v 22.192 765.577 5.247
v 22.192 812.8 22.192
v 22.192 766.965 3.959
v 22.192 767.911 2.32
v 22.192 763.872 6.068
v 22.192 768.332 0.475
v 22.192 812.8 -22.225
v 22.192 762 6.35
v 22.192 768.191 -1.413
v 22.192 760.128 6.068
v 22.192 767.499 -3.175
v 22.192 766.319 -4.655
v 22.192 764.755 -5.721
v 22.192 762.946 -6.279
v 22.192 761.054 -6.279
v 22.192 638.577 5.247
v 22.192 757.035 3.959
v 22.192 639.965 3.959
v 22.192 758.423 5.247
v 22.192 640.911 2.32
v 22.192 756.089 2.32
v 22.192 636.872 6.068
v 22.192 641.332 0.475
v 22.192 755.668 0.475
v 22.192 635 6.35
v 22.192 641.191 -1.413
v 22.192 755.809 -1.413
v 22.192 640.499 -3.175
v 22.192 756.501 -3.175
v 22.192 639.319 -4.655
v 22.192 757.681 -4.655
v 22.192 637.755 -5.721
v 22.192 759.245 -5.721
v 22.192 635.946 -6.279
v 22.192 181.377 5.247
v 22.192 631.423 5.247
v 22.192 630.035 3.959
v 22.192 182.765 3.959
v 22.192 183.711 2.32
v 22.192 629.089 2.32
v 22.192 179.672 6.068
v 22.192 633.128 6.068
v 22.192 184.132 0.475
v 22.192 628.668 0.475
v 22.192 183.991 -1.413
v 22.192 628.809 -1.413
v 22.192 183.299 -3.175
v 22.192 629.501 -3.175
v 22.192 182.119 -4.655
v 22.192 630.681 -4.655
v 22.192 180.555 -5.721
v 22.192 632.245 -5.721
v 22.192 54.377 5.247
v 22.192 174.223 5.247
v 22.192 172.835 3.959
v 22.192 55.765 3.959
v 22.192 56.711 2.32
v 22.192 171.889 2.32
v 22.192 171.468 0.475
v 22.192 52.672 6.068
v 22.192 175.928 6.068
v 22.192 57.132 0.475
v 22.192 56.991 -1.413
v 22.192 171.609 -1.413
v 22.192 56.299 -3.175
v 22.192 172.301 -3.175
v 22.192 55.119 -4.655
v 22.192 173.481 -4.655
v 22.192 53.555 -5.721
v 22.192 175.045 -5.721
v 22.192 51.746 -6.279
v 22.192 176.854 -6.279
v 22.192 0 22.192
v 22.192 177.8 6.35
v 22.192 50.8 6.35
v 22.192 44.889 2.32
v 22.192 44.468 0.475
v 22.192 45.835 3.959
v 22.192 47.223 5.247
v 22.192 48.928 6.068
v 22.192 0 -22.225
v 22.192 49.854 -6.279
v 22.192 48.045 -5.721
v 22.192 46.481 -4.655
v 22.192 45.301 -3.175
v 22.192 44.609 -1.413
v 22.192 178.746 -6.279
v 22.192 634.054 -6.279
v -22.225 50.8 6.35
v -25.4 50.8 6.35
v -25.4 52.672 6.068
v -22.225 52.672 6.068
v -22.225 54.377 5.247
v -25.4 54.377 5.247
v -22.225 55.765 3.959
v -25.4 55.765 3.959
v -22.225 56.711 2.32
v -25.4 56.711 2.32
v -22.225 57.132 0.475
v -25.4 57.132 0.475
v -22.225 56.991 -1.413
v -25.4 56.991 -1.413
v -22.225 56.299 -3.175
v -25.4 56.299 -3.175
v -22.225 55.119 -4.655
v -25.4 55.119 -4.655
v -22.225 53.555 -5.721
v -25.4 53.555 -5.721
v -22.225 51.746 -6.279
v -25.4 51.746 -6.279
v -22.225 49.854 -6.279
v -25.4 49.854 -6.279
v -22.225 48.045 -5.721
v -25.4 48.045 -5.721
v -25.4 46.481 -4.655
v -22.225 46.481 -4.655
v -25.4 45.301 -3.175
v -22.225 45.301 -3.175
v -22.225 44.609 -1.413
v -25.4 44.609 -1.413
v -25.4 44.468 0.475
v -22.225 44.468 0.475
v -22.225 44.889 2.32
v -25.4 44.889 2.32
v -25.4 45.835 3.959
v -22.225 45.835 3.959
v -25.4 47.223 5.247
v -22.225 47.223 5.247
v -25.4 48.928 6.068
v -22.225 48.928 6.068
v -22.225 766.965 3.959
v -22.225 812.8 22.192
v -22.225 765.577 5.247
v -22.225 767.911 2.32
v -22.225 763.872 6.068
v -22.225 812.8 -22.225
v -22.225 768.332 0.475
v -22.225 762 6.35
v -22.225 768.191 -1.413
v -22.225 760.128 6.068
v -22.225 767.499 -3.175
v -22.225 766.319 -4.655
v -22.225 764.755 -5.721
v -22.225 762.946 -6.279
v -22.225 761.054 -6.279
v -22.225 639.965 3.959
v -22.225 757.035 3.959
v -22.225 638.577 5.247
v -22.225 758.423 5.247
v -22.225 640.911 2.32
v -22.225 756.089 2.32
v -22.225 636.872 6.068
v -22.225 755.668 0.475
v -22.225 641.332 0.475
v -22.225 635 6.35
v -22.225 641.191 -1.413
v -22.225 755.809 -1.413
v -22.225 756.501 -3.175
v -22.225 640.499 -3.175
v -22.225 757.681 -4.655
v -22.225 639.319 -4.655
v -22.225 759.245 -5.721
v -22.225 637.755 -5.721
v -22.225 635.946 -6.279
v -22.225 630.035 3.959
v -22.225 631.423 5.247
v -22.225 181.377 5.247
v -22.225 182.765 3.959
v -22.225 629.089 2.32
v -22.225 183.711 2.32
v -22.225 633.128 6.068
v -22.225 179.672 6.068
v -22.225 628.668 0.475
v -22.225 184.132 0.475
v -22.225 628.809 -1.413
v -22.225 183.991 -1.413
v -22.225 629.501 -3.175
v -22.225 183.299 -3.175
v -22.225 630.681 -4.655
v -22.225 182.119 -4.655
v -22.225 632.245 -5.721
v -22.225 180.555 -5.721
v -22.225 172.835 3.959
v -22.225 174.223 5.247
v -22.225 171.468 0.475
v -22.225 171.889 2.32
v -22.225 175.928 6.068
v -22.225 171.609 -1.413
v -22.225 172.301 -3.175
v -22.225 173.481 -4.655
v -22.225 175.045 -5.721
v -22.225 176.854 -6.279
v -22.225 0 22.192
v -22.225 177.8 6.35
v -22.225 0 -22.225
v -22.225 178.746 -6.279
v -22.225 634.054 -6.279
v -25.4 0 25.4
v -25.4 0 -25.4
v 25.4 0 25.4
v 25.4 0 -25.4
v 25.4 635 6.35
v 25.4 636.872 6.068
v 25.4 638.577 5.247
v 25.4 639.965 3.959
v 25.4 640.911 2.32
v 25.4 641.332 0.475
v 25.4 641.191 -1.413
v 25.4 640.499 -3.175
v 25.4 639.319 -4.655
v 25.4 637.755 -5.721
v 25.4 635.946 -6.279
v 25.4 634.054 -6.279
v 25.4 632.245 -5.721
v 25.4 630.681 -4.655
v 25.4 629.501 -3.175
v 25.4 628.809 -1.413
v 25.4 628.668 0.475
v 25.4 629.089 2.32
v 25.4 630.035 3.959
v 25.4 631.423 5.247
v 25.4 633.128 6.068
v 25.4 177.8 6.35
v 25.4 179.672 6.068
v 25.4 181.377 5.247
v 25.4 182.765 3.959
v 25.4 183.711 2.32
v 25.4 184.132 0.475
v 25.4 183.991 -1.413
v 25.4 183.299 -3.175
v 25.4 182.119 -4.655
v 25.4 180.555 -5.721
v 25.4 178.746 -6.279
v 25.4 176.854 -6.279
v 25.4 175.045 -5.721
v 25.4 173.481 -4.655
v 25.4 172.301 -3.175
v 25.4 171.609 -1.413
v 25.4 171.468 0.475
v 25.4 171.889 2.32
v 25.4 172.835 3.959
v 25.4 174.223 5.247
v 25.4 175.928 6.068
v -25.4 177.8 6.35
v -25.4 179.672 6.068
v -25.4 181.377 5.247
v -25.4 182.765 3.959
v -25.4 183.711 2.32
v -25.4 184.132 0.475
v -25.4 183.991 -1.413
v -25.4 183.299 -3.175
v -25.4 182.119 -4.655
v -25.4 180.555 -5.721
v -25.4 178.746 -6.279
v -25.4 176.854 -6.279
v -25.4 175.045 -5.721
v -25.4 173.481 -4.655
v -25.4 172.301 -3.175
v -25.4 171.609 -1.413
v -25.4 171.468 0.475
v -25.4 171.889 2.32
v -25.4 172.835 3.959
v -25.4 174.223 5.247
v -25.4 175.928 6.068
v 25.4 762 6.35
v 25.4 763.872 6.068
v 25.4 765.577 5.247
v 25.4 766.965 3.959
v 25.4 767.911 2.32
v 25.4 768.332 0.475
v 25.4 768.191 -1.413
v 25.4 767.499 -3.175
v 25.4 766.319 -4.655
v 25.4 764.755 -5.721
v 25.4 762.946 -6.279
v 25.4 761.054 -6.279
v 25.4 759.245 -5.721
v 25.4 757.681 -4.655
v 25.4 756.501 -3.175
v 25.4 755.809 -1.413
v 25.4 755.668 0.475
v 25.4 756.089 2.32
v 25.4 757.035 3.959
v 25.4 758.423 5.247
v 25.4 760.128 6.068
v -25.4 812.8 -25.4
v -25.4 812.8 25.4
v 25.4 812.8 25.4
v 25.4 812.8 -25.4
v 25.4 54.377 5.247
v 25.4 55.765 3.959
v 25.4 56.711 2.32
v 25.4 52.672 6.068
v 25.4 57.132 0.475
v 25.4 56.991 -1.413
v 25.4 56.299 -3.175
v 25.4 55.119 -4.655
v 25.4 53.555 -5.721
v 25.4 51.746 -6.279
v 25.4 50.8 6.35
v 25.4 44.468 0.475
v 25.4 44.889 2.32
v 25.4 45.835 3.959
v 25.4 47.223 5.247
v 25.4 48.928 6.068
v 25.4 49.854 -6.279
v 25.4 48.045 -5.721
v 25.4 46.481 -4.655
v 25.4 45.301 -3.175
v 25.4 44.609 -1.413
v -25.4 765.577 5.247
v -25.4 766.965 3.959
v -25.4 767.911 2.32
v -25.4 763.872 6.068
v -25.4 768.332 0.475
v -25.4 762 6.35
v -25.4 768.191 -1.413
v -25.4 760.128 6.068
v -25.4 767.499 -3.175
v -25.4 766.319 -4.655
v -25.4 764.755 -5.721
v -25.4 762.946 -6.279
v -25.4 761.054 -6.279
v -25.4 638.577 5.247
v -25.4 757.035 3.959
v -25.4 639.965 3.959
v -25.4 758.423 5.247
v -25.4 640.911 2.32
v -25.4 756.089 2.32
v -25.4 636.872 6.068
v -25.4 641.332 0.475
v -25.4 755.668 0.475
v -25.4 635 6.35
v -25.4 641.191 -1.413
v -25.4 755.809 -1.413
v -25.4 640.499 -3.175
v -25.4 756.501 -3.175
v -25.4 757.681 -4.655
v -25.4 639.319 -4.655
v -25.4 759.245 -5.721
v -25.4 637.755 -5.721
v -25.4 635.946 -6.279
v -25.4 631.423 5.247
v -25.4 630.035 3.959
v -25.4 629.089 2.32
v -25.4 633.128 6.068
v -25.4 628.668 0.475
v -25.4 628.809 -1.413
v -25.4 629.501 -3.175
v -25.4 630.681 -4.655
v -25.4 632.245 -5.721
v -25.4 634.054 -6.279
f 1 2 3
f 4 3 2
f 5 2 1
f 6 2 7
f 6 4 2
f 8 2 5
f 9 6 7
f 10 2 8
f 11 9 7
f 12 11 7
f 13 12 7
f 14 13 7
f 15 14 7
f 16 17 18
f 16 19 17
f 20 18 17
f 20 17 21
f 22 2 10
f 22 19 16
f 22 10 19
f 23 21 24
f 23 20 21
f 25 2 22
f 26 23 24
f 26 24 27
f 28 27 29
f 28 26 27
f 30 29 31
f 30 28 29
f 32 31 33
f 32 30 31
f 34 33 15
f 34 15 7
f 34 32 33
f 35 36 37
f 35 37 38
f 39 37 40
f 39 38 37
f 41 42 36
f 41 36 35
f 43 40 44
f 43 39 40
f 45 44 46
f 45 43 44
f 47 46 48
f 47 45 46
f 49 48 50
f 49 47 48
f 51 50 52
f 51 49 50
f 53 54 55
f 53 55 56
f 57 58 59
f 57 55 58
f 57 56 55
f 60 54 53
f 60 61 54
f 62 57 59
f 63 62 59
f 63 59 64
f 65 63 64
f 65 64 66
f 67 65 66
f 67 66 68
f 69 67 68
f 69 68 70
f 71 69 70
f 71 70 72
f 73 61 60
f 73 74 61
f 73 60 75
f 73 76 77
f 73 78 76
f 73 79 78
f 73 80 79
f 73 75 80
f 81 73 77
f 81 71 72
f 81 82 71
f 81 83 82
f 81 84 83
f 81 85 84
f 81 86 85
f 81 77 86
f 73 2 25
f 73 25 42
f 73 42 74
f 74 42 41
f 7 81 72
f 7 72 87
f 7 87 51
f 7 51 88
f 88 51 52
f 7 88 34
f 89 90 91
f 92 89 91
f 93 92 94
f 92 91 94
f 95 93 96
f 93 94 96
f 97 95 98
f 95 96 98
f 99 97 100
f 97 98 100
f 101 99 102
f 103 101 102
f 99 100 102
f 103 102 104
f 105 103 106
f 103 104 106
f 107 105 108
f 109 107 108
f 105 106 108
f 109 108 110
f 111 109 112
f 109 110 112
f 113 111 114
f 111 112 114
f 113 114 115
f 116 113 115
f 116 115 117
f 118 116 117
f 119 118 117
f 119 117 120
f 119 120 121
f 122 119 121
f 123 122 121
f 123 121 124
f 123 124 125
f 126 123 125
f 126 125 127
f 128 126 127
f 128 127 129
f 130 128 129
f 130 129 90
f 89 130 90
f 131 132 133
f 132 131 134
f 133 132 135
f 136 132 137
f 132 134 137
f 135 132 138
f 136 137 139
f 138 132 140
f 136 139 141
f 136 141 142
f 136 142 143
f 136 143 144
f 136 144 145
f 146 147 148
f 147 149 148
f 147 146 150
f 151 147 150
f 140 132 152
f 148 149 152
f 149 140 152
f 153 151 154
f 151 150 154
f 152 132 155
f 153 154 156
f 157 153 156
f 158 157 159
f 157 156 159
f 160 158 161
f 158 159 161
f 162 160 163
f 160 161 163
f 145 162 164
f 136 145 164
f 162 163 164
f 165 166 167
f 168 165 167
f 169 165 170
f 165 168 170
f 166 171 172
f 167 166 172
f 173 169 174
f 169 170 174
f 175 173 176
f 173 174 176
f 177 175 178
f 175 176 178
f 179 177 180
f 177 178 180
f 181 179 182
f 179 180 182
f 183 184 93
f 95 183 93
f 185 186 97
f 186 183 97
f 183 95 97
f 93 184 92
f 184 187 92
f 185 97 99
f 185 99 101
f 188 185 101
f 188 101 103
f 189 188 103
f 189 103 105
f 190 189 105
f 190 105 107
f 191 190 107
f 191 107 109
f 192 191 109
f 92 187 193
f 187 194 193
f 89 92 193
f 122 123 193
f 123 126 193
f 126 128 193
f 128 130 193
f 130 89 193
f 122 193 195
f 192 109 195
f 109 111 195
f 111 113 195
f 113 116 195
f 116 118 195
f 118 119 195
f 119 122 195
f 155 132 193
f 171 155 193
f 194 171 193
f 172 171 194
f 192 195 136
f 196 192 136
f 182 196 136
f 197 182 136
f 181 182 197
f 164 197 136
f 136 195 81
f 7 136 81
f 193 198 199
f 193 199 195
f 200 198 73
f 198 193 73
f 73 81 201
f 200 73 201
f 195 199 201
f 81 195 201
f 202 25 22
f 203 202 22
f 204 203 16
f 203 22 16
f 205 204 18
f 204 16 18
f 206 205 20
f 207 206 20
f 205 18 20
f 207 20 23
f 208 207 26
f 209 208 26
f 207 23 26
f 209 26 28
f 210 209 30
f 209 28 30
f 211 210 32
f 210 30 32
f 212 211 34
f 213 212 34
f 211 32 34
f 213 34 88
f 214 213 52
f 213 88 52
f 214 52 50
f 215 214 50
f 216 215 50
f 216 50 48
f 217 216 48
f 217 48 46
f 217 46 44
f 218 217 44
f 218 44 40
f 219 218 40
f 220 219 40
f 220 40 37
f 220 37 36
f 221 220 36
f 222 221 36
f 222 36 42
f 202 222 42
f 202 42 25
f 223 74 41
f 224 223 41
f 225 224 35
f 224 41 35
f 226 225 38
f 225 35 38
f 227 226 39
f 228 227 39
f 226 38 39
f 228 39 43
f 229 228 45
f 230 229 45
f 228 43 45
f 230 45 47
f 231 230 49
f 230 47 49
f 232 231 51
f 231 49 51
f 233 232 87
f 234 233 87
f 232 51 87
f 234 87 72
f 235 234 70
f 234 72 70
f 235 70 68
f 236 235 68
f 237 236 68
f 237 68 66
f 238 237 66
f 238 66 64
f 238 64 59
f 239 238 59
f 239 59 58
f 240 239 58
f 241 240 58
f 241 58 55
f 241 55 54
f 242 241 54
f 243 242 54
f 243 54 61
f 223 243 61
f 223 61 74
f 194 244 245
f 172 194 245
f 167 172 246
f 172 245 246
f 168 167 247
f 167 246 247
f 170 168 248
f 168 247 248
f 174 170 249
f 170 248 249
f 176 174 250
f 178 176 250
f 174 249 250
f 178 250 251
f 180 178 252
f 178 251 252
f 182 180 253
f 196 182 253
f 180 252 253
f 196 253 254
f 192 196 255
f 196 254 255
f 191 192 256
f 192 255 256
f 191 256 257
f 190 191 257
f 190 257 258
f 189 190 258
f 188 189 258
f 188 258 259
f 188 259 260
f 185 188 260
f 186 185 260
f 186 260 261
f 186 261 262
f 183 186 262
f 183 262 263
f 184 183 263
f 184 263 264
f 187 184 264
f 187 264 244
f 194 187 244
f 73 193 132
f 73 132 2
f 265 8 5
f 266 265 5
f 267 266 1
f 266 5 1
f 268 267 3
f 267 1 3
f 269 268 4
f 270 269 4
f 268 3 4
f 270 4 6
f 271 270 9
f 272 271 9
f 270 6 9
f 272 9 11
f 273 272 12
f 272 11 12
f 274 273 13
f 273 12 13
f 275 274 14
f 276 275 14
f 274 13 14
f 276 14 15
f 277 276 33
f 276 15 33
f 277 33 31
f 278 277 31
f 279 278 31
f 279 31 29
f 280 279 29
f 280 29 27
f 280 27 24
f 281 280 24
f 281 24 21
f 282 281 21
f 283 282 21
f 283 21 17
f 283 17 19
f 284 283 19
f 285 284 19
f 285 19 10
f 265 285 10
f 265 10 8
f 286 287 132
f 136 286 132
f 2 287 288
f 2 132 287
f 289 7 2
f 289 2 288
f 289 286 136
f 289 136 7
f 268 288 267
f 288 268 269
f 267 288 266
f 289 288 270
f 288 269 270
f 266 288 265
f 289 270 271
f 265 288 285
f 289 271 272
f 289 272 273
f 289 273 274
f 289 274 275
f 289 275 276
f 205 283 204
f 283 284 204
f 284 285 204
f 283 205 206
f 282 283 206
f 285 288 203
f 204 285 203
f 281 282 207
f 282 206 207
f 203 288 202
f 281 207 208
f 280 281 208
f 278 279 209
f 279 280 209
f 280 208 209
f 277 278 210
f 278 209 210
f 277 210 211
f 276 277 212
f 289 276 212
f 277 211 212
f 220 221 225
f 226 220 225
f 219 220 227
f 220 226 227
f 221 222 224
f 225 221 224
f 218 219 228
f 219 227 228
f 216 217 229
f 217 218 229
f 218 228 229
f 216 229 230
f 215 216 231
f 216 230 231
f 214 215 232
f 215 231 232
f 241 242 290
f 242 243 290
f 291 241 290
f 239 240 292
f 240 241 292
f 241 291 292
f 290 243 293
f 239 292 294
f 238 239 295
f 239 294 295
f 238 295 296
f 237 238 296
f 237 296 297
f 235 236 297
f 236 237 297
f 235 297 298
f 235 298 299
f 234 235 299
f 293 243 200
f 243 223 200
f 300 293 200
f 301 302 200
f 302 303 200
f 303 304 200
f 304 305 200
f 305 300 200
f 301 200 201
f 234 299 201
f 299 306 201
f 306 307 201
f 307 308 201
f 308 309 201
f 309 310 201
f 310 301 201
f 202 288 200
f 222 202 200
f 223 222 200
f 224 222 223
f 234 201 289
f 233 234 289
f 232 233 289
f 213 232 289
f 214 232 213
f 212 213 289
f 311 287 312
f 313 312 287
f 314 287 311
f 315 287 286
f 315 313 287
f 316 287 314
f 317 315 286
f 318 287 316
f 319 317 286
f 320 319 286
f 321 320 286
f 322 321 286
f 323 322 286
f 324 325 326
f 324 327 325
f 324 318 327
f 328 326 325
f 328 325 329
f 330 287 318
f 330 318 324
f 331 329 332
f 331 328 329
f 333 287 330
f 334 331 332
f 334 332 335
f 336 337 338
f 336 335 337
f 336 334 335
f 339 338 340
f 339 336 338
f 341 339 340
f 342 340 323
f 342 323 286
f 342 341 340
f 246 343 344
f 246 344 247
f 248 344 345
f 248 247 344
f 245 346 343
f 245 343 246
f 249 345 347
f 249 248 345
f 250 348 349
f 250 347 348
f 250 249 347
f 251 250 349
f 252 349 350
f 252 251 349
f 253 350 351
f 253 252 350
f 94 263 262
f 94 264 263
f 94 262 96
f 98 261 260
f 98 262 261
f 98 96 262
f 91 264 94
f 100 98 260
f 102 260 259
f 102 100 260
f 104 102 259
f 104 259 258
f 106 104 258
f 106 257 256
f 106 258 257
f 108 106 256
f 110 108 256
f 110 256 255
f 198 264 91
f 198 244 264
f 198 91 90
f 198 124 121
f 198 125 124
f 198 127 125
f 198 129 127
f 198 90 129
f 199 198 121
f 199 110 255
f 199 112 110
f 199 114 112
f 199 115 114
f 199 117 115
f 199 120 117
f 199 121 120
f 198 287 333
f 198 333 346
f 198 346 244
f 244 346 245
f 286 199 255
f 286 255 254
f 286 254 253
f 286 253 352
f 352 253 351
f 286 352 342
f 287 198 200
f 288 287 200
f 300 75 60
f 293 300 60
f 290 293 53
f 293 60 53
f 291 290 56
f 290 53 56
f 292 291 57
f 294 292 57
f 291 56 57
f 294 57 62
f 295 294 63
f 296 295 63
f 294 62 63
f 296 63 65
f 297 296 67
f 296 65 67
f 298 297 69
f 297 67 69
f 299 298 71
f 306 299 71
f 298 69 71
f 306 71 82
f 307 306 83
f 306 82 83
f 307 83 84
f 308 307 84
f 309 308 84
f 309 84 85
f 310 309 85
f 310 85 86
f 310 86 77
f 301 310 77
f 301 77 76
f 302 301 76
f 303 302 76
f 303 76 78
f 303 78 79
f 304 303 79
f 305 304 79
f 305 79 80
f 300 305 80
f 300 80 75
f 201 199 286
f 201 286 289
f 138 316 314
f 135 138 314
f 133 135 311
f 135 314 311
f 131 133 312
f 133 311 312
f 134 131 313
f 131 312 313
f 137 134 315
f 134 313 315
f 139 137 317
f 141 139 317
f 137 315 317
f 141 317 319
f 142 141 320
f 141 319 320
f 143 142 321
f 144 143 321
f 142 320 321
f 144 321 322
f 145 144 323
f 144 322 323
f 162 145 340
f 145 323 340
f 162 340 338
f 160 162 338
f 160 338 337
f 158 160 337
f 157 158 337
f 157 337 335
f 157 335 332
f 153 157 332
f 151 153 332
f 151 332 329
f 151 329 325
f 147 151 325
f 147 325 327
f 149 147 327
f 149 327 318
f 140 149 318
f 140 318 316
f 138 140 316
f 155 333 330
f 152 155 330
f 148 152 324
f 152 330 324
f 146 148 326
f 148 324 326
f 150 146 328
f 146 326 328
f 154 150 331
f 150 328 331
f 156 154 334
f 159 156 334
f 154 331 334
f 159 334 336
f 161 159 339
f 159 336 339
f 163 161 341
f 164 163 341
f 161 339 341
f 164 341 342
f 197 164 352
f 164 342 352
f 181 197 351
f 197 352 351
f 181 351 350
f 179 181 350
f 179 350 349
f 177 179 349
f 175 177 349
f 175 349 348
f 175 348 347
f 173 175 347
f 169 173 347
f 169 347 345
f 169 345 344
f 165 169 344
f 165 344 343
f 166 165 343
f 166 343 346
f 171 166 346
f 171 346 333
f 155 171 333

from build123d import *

# Parameters (mm, degrees)
SKETCH1_W           = 50.8
SKETCH1_H           = 50.8
SKETCH1_W_2         = 44.416753927
SKETCH1_H_2         = 44.416753927
BOSS_EXTRUDE1_DEPTH = 812.8
SKETCH2_R           = 6.35
CUT_EXTRUDE1_DEPTH  = 51.8


with BuildPart() as part:
    # Sketch1 → Boss-Extrude1 (new body)
    with BuildSketch(Plane(origin=(0, 0, 0), x_dir=(1, 0, 0), z_dir=(0, 1, 0))):
        Rectangle(SKETCH1_W, SKETCH1_H)
        with Locations((-0.016623037, 0.016623037)):
            Rectangle(SKETCH1_W_2, SKETCH1_H_2, mode=Mode.SUBTRACT)
    extrude(amount=BOSS_EXTRUDE1_DEPTH)

    # Sketch2 → Cut-Extrude1 (cut, through all)
    with BuildSketch(Plane.ZY.offset(25.4)):
        with Locations((0, 50.8)):
            Circle(SKETCH2_R)
        with Locations((0, 177.8)):
            Circle(SKETCH2_R)
        with Locations((0, 635)):
            Circle(SKETCH2_R)
        with Locations((0, 762)):
            Circle(SKETCH2_R)
    extrude(amount=-CUT_EXTRUDE1_DEPTH, mode=Mode.SUBTRACT)


solid = part.part
